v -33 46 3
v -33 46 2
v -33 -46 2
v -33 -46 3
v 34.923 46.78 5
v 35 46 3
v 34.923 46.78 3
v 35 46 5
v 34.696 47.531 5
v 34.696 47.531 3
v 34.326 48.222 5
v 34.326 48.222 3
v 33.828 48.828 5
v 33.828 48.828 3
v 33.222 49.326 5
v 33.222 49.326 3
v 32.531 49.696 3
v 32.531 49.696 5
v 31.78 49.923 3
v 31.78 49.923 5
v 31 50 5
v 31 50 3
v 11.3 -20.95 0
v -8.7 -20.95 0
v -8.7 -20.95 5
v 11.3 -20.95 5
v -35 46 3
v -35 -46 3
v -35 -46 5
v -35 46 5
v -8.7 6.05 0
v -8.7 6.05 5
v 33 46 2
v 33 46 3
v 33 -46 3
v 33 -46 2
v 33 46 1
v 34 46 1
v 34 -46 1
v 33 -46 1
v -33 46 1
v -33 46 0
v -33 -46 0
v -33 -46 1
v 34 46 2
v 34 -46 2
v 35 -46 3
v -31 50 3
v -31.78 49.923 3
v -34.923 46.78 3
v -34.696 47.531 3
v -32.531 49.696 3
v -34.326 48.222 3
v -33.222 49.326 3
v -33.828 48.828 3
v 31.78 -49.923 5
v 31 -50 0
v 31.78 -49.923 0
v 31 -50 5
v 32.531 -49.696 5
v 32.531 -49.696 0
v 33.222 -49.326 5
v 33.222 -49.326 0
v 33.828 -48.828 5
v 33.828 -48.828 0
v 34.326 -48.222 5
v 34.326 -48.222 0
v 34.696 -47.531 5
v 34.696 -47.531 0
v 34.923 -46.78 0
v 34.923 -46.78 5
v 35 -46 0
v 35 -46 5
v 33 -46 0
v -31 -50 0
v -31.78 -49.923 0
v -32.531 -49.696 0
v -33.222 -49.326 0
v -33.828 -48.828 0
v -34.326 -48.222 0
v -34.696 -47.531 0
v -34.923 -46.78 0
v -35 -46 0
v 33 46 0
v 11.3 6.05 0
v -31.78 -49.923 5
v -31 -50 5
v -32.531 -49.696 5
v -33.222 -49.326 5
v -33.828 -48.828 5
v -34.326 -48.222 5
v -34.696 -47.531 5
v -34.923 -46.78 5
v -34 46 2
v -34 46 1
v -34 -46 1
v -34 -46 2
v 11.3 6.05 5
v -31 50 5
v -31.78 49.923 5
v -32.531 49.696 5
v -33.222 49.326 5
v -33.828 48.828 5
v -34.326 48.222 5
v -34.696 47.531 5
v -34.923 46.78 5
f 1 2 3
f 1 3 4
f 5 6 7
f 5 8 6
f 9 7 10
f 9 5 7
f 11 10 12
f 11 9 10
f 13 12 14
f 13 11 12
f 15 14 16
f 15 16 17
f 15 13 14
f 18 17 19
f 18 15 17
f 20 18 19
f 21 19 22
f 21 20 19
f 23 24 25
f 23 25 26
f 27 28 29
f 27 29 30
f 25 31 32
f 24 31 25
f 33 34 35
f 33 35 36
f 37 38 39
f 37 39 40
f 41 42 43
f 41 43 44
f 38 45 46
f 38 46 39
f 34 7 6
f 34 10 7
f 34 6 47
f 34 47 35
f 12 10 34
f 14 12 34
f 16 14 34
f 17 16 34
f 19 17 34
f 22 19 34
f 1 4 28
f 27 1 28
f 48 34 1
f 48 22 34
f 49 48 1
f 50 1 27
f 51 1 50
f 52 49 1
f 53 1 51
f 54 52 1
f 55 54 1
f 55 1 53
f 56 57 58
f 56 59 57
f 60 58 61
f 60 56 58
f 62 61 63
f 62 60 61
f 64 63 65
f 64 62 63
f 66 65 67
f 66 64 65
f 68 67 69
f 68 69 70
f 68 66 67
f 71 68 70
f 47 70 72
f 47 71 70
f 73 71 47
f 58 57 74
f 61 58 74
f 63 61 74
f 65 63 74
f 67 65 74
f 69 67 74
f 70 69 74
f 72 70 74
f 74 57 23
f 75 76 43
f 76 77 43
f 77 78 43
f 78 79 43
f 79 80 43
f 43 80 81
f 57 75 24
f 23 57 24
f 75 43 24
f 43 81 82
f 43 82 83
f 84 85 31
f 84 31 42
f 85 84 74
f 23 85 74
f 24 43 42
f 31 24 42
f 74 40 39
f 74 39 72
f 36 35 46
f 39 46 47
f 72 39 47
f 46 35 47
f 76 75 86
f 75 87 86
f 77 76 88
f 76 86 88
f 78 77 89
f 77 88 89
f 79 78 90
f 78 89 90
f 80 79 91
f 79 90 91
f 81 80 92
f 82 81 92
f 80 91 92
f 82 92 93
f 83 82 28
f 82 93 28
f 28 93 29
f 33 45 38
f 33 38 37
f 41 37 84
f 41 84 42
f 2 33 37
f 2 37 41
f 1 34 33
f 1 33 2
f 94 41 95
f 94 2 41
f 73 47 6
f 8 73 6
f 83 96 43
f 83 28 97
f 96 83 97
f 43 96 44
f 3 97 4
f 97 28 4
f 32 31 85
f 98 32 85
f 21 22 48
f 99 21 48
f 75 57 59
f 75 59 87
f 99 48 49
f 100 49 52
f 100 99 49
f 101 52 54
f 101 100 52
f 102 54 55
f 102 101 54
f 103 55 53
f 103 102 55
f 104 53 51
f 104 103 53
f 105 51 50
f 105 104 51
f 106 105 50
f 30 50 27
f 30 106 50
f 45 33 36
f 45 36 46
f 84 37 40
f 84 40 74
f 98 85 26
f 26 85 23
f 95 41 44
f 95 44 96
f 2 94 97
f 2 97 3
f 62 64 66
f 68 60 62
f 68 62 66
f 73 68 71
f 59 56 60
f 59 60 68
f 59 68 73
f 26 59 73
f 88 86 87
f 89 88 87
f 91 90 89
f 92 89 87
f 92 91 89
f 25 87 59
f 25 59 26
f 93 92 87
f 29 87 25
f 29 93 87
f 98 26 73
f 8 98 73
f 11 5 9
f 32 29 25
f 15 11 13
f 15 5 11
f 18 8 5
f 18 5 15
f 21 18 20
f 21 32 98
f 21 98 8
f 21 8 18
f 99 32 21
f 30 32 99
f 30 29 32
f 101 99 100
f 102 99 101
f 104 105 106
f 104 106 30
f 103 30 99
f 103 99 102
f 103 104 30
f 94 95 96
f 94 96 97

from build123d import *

# Parameters (mm, degrees)
SKETCH1_W           = 100
SKETCH1_H           = 70
BOSS_EXTRUDE1_DEPTH = 5
FILLET1_R           = 4
SKETCH3_W           = 20
SKETCH3_H           = 27
CUT_EXTRUDE1_DEPTH  = 5
CUT_EXTRUDE2_DEPTH  = 96
SKETCH6_W           = 70
SKETCH6_H           = 3
CUT_EXTRUDE3_DEPTH  = 4


with BuildPart() as part:
    # Sketch1 → Boss-Extrude1 (new body)
    with BuildSketch(Plane(origin=(0, 0, 0), x_dir=(0, 1, 0), z_dir=(0, 0, 1))):
        Rectangle(SKETCH1_W, SKETCH1_H)
    extrude(amount=BOSS_EXTRUDE1_DEPTH)

    # Fillet1
    fillet1_edges = [part.edges().sort_by_distance(p)[0] for p in [
        (35, 50, 2.5),
        (35, -50, 2.5),
        (-35, -50, 2.5),
        (-35, 50, 2.5),
    ]]
    fillet(fillet1_edges, radius=FILLET1_R)

    # Sketch3 → Cut-Extrude1 (cut)
    with BuildSketch(Plane(origin=(0, 0, 0), x_dir=(1, 0, 0), z_dir=(0, 0, -1))):
        with Locations((1.3, 7.45)):
            Rectangle(SKETCH3_W, SKETCH3_H)
    extrude(amount=-CUT_EXTRUDE1_DEPTH, mode=Mode.SUBTRACT)

    # Sketch5 → Cut-Extrude2 (cut)
    with BuildSketch(Plane(origin=(0, 50, 0), x_dir=(-1, 0, 0), z_dir=(0, 1, 0))):
        Polygon((-35, 3), (-33, 3), (-33, 2), (-34, 2), (-34, 1), (-33, 1), (-33, 0), (-35, 0), align=None)
        Polygon((35, 3), (35, 0), (33, 0), (33, 1), (34, 1), (34, 2), (33, 2), (33, 3), align=None)
    extrude(amount=-CUT_EXTRUDE2_DEPTH, mode=Mode.SUBTRACT)

    # Sketch6 → Cut-Extrude3 (cut)
    with BuildSketch(Plane(origin=(0, 50, 0), x_dir=(-1, 0, 0), z_dir=(0, 1, 0))):
        with Locations((0, 1.5)):
            Rectangle(SKETCH6_W, SKETCH6_H)
    extrude(amount=-CUT_EXTRUDE3_DEPTH, mode=Mode.SUBTRACT)


solid = part.part
